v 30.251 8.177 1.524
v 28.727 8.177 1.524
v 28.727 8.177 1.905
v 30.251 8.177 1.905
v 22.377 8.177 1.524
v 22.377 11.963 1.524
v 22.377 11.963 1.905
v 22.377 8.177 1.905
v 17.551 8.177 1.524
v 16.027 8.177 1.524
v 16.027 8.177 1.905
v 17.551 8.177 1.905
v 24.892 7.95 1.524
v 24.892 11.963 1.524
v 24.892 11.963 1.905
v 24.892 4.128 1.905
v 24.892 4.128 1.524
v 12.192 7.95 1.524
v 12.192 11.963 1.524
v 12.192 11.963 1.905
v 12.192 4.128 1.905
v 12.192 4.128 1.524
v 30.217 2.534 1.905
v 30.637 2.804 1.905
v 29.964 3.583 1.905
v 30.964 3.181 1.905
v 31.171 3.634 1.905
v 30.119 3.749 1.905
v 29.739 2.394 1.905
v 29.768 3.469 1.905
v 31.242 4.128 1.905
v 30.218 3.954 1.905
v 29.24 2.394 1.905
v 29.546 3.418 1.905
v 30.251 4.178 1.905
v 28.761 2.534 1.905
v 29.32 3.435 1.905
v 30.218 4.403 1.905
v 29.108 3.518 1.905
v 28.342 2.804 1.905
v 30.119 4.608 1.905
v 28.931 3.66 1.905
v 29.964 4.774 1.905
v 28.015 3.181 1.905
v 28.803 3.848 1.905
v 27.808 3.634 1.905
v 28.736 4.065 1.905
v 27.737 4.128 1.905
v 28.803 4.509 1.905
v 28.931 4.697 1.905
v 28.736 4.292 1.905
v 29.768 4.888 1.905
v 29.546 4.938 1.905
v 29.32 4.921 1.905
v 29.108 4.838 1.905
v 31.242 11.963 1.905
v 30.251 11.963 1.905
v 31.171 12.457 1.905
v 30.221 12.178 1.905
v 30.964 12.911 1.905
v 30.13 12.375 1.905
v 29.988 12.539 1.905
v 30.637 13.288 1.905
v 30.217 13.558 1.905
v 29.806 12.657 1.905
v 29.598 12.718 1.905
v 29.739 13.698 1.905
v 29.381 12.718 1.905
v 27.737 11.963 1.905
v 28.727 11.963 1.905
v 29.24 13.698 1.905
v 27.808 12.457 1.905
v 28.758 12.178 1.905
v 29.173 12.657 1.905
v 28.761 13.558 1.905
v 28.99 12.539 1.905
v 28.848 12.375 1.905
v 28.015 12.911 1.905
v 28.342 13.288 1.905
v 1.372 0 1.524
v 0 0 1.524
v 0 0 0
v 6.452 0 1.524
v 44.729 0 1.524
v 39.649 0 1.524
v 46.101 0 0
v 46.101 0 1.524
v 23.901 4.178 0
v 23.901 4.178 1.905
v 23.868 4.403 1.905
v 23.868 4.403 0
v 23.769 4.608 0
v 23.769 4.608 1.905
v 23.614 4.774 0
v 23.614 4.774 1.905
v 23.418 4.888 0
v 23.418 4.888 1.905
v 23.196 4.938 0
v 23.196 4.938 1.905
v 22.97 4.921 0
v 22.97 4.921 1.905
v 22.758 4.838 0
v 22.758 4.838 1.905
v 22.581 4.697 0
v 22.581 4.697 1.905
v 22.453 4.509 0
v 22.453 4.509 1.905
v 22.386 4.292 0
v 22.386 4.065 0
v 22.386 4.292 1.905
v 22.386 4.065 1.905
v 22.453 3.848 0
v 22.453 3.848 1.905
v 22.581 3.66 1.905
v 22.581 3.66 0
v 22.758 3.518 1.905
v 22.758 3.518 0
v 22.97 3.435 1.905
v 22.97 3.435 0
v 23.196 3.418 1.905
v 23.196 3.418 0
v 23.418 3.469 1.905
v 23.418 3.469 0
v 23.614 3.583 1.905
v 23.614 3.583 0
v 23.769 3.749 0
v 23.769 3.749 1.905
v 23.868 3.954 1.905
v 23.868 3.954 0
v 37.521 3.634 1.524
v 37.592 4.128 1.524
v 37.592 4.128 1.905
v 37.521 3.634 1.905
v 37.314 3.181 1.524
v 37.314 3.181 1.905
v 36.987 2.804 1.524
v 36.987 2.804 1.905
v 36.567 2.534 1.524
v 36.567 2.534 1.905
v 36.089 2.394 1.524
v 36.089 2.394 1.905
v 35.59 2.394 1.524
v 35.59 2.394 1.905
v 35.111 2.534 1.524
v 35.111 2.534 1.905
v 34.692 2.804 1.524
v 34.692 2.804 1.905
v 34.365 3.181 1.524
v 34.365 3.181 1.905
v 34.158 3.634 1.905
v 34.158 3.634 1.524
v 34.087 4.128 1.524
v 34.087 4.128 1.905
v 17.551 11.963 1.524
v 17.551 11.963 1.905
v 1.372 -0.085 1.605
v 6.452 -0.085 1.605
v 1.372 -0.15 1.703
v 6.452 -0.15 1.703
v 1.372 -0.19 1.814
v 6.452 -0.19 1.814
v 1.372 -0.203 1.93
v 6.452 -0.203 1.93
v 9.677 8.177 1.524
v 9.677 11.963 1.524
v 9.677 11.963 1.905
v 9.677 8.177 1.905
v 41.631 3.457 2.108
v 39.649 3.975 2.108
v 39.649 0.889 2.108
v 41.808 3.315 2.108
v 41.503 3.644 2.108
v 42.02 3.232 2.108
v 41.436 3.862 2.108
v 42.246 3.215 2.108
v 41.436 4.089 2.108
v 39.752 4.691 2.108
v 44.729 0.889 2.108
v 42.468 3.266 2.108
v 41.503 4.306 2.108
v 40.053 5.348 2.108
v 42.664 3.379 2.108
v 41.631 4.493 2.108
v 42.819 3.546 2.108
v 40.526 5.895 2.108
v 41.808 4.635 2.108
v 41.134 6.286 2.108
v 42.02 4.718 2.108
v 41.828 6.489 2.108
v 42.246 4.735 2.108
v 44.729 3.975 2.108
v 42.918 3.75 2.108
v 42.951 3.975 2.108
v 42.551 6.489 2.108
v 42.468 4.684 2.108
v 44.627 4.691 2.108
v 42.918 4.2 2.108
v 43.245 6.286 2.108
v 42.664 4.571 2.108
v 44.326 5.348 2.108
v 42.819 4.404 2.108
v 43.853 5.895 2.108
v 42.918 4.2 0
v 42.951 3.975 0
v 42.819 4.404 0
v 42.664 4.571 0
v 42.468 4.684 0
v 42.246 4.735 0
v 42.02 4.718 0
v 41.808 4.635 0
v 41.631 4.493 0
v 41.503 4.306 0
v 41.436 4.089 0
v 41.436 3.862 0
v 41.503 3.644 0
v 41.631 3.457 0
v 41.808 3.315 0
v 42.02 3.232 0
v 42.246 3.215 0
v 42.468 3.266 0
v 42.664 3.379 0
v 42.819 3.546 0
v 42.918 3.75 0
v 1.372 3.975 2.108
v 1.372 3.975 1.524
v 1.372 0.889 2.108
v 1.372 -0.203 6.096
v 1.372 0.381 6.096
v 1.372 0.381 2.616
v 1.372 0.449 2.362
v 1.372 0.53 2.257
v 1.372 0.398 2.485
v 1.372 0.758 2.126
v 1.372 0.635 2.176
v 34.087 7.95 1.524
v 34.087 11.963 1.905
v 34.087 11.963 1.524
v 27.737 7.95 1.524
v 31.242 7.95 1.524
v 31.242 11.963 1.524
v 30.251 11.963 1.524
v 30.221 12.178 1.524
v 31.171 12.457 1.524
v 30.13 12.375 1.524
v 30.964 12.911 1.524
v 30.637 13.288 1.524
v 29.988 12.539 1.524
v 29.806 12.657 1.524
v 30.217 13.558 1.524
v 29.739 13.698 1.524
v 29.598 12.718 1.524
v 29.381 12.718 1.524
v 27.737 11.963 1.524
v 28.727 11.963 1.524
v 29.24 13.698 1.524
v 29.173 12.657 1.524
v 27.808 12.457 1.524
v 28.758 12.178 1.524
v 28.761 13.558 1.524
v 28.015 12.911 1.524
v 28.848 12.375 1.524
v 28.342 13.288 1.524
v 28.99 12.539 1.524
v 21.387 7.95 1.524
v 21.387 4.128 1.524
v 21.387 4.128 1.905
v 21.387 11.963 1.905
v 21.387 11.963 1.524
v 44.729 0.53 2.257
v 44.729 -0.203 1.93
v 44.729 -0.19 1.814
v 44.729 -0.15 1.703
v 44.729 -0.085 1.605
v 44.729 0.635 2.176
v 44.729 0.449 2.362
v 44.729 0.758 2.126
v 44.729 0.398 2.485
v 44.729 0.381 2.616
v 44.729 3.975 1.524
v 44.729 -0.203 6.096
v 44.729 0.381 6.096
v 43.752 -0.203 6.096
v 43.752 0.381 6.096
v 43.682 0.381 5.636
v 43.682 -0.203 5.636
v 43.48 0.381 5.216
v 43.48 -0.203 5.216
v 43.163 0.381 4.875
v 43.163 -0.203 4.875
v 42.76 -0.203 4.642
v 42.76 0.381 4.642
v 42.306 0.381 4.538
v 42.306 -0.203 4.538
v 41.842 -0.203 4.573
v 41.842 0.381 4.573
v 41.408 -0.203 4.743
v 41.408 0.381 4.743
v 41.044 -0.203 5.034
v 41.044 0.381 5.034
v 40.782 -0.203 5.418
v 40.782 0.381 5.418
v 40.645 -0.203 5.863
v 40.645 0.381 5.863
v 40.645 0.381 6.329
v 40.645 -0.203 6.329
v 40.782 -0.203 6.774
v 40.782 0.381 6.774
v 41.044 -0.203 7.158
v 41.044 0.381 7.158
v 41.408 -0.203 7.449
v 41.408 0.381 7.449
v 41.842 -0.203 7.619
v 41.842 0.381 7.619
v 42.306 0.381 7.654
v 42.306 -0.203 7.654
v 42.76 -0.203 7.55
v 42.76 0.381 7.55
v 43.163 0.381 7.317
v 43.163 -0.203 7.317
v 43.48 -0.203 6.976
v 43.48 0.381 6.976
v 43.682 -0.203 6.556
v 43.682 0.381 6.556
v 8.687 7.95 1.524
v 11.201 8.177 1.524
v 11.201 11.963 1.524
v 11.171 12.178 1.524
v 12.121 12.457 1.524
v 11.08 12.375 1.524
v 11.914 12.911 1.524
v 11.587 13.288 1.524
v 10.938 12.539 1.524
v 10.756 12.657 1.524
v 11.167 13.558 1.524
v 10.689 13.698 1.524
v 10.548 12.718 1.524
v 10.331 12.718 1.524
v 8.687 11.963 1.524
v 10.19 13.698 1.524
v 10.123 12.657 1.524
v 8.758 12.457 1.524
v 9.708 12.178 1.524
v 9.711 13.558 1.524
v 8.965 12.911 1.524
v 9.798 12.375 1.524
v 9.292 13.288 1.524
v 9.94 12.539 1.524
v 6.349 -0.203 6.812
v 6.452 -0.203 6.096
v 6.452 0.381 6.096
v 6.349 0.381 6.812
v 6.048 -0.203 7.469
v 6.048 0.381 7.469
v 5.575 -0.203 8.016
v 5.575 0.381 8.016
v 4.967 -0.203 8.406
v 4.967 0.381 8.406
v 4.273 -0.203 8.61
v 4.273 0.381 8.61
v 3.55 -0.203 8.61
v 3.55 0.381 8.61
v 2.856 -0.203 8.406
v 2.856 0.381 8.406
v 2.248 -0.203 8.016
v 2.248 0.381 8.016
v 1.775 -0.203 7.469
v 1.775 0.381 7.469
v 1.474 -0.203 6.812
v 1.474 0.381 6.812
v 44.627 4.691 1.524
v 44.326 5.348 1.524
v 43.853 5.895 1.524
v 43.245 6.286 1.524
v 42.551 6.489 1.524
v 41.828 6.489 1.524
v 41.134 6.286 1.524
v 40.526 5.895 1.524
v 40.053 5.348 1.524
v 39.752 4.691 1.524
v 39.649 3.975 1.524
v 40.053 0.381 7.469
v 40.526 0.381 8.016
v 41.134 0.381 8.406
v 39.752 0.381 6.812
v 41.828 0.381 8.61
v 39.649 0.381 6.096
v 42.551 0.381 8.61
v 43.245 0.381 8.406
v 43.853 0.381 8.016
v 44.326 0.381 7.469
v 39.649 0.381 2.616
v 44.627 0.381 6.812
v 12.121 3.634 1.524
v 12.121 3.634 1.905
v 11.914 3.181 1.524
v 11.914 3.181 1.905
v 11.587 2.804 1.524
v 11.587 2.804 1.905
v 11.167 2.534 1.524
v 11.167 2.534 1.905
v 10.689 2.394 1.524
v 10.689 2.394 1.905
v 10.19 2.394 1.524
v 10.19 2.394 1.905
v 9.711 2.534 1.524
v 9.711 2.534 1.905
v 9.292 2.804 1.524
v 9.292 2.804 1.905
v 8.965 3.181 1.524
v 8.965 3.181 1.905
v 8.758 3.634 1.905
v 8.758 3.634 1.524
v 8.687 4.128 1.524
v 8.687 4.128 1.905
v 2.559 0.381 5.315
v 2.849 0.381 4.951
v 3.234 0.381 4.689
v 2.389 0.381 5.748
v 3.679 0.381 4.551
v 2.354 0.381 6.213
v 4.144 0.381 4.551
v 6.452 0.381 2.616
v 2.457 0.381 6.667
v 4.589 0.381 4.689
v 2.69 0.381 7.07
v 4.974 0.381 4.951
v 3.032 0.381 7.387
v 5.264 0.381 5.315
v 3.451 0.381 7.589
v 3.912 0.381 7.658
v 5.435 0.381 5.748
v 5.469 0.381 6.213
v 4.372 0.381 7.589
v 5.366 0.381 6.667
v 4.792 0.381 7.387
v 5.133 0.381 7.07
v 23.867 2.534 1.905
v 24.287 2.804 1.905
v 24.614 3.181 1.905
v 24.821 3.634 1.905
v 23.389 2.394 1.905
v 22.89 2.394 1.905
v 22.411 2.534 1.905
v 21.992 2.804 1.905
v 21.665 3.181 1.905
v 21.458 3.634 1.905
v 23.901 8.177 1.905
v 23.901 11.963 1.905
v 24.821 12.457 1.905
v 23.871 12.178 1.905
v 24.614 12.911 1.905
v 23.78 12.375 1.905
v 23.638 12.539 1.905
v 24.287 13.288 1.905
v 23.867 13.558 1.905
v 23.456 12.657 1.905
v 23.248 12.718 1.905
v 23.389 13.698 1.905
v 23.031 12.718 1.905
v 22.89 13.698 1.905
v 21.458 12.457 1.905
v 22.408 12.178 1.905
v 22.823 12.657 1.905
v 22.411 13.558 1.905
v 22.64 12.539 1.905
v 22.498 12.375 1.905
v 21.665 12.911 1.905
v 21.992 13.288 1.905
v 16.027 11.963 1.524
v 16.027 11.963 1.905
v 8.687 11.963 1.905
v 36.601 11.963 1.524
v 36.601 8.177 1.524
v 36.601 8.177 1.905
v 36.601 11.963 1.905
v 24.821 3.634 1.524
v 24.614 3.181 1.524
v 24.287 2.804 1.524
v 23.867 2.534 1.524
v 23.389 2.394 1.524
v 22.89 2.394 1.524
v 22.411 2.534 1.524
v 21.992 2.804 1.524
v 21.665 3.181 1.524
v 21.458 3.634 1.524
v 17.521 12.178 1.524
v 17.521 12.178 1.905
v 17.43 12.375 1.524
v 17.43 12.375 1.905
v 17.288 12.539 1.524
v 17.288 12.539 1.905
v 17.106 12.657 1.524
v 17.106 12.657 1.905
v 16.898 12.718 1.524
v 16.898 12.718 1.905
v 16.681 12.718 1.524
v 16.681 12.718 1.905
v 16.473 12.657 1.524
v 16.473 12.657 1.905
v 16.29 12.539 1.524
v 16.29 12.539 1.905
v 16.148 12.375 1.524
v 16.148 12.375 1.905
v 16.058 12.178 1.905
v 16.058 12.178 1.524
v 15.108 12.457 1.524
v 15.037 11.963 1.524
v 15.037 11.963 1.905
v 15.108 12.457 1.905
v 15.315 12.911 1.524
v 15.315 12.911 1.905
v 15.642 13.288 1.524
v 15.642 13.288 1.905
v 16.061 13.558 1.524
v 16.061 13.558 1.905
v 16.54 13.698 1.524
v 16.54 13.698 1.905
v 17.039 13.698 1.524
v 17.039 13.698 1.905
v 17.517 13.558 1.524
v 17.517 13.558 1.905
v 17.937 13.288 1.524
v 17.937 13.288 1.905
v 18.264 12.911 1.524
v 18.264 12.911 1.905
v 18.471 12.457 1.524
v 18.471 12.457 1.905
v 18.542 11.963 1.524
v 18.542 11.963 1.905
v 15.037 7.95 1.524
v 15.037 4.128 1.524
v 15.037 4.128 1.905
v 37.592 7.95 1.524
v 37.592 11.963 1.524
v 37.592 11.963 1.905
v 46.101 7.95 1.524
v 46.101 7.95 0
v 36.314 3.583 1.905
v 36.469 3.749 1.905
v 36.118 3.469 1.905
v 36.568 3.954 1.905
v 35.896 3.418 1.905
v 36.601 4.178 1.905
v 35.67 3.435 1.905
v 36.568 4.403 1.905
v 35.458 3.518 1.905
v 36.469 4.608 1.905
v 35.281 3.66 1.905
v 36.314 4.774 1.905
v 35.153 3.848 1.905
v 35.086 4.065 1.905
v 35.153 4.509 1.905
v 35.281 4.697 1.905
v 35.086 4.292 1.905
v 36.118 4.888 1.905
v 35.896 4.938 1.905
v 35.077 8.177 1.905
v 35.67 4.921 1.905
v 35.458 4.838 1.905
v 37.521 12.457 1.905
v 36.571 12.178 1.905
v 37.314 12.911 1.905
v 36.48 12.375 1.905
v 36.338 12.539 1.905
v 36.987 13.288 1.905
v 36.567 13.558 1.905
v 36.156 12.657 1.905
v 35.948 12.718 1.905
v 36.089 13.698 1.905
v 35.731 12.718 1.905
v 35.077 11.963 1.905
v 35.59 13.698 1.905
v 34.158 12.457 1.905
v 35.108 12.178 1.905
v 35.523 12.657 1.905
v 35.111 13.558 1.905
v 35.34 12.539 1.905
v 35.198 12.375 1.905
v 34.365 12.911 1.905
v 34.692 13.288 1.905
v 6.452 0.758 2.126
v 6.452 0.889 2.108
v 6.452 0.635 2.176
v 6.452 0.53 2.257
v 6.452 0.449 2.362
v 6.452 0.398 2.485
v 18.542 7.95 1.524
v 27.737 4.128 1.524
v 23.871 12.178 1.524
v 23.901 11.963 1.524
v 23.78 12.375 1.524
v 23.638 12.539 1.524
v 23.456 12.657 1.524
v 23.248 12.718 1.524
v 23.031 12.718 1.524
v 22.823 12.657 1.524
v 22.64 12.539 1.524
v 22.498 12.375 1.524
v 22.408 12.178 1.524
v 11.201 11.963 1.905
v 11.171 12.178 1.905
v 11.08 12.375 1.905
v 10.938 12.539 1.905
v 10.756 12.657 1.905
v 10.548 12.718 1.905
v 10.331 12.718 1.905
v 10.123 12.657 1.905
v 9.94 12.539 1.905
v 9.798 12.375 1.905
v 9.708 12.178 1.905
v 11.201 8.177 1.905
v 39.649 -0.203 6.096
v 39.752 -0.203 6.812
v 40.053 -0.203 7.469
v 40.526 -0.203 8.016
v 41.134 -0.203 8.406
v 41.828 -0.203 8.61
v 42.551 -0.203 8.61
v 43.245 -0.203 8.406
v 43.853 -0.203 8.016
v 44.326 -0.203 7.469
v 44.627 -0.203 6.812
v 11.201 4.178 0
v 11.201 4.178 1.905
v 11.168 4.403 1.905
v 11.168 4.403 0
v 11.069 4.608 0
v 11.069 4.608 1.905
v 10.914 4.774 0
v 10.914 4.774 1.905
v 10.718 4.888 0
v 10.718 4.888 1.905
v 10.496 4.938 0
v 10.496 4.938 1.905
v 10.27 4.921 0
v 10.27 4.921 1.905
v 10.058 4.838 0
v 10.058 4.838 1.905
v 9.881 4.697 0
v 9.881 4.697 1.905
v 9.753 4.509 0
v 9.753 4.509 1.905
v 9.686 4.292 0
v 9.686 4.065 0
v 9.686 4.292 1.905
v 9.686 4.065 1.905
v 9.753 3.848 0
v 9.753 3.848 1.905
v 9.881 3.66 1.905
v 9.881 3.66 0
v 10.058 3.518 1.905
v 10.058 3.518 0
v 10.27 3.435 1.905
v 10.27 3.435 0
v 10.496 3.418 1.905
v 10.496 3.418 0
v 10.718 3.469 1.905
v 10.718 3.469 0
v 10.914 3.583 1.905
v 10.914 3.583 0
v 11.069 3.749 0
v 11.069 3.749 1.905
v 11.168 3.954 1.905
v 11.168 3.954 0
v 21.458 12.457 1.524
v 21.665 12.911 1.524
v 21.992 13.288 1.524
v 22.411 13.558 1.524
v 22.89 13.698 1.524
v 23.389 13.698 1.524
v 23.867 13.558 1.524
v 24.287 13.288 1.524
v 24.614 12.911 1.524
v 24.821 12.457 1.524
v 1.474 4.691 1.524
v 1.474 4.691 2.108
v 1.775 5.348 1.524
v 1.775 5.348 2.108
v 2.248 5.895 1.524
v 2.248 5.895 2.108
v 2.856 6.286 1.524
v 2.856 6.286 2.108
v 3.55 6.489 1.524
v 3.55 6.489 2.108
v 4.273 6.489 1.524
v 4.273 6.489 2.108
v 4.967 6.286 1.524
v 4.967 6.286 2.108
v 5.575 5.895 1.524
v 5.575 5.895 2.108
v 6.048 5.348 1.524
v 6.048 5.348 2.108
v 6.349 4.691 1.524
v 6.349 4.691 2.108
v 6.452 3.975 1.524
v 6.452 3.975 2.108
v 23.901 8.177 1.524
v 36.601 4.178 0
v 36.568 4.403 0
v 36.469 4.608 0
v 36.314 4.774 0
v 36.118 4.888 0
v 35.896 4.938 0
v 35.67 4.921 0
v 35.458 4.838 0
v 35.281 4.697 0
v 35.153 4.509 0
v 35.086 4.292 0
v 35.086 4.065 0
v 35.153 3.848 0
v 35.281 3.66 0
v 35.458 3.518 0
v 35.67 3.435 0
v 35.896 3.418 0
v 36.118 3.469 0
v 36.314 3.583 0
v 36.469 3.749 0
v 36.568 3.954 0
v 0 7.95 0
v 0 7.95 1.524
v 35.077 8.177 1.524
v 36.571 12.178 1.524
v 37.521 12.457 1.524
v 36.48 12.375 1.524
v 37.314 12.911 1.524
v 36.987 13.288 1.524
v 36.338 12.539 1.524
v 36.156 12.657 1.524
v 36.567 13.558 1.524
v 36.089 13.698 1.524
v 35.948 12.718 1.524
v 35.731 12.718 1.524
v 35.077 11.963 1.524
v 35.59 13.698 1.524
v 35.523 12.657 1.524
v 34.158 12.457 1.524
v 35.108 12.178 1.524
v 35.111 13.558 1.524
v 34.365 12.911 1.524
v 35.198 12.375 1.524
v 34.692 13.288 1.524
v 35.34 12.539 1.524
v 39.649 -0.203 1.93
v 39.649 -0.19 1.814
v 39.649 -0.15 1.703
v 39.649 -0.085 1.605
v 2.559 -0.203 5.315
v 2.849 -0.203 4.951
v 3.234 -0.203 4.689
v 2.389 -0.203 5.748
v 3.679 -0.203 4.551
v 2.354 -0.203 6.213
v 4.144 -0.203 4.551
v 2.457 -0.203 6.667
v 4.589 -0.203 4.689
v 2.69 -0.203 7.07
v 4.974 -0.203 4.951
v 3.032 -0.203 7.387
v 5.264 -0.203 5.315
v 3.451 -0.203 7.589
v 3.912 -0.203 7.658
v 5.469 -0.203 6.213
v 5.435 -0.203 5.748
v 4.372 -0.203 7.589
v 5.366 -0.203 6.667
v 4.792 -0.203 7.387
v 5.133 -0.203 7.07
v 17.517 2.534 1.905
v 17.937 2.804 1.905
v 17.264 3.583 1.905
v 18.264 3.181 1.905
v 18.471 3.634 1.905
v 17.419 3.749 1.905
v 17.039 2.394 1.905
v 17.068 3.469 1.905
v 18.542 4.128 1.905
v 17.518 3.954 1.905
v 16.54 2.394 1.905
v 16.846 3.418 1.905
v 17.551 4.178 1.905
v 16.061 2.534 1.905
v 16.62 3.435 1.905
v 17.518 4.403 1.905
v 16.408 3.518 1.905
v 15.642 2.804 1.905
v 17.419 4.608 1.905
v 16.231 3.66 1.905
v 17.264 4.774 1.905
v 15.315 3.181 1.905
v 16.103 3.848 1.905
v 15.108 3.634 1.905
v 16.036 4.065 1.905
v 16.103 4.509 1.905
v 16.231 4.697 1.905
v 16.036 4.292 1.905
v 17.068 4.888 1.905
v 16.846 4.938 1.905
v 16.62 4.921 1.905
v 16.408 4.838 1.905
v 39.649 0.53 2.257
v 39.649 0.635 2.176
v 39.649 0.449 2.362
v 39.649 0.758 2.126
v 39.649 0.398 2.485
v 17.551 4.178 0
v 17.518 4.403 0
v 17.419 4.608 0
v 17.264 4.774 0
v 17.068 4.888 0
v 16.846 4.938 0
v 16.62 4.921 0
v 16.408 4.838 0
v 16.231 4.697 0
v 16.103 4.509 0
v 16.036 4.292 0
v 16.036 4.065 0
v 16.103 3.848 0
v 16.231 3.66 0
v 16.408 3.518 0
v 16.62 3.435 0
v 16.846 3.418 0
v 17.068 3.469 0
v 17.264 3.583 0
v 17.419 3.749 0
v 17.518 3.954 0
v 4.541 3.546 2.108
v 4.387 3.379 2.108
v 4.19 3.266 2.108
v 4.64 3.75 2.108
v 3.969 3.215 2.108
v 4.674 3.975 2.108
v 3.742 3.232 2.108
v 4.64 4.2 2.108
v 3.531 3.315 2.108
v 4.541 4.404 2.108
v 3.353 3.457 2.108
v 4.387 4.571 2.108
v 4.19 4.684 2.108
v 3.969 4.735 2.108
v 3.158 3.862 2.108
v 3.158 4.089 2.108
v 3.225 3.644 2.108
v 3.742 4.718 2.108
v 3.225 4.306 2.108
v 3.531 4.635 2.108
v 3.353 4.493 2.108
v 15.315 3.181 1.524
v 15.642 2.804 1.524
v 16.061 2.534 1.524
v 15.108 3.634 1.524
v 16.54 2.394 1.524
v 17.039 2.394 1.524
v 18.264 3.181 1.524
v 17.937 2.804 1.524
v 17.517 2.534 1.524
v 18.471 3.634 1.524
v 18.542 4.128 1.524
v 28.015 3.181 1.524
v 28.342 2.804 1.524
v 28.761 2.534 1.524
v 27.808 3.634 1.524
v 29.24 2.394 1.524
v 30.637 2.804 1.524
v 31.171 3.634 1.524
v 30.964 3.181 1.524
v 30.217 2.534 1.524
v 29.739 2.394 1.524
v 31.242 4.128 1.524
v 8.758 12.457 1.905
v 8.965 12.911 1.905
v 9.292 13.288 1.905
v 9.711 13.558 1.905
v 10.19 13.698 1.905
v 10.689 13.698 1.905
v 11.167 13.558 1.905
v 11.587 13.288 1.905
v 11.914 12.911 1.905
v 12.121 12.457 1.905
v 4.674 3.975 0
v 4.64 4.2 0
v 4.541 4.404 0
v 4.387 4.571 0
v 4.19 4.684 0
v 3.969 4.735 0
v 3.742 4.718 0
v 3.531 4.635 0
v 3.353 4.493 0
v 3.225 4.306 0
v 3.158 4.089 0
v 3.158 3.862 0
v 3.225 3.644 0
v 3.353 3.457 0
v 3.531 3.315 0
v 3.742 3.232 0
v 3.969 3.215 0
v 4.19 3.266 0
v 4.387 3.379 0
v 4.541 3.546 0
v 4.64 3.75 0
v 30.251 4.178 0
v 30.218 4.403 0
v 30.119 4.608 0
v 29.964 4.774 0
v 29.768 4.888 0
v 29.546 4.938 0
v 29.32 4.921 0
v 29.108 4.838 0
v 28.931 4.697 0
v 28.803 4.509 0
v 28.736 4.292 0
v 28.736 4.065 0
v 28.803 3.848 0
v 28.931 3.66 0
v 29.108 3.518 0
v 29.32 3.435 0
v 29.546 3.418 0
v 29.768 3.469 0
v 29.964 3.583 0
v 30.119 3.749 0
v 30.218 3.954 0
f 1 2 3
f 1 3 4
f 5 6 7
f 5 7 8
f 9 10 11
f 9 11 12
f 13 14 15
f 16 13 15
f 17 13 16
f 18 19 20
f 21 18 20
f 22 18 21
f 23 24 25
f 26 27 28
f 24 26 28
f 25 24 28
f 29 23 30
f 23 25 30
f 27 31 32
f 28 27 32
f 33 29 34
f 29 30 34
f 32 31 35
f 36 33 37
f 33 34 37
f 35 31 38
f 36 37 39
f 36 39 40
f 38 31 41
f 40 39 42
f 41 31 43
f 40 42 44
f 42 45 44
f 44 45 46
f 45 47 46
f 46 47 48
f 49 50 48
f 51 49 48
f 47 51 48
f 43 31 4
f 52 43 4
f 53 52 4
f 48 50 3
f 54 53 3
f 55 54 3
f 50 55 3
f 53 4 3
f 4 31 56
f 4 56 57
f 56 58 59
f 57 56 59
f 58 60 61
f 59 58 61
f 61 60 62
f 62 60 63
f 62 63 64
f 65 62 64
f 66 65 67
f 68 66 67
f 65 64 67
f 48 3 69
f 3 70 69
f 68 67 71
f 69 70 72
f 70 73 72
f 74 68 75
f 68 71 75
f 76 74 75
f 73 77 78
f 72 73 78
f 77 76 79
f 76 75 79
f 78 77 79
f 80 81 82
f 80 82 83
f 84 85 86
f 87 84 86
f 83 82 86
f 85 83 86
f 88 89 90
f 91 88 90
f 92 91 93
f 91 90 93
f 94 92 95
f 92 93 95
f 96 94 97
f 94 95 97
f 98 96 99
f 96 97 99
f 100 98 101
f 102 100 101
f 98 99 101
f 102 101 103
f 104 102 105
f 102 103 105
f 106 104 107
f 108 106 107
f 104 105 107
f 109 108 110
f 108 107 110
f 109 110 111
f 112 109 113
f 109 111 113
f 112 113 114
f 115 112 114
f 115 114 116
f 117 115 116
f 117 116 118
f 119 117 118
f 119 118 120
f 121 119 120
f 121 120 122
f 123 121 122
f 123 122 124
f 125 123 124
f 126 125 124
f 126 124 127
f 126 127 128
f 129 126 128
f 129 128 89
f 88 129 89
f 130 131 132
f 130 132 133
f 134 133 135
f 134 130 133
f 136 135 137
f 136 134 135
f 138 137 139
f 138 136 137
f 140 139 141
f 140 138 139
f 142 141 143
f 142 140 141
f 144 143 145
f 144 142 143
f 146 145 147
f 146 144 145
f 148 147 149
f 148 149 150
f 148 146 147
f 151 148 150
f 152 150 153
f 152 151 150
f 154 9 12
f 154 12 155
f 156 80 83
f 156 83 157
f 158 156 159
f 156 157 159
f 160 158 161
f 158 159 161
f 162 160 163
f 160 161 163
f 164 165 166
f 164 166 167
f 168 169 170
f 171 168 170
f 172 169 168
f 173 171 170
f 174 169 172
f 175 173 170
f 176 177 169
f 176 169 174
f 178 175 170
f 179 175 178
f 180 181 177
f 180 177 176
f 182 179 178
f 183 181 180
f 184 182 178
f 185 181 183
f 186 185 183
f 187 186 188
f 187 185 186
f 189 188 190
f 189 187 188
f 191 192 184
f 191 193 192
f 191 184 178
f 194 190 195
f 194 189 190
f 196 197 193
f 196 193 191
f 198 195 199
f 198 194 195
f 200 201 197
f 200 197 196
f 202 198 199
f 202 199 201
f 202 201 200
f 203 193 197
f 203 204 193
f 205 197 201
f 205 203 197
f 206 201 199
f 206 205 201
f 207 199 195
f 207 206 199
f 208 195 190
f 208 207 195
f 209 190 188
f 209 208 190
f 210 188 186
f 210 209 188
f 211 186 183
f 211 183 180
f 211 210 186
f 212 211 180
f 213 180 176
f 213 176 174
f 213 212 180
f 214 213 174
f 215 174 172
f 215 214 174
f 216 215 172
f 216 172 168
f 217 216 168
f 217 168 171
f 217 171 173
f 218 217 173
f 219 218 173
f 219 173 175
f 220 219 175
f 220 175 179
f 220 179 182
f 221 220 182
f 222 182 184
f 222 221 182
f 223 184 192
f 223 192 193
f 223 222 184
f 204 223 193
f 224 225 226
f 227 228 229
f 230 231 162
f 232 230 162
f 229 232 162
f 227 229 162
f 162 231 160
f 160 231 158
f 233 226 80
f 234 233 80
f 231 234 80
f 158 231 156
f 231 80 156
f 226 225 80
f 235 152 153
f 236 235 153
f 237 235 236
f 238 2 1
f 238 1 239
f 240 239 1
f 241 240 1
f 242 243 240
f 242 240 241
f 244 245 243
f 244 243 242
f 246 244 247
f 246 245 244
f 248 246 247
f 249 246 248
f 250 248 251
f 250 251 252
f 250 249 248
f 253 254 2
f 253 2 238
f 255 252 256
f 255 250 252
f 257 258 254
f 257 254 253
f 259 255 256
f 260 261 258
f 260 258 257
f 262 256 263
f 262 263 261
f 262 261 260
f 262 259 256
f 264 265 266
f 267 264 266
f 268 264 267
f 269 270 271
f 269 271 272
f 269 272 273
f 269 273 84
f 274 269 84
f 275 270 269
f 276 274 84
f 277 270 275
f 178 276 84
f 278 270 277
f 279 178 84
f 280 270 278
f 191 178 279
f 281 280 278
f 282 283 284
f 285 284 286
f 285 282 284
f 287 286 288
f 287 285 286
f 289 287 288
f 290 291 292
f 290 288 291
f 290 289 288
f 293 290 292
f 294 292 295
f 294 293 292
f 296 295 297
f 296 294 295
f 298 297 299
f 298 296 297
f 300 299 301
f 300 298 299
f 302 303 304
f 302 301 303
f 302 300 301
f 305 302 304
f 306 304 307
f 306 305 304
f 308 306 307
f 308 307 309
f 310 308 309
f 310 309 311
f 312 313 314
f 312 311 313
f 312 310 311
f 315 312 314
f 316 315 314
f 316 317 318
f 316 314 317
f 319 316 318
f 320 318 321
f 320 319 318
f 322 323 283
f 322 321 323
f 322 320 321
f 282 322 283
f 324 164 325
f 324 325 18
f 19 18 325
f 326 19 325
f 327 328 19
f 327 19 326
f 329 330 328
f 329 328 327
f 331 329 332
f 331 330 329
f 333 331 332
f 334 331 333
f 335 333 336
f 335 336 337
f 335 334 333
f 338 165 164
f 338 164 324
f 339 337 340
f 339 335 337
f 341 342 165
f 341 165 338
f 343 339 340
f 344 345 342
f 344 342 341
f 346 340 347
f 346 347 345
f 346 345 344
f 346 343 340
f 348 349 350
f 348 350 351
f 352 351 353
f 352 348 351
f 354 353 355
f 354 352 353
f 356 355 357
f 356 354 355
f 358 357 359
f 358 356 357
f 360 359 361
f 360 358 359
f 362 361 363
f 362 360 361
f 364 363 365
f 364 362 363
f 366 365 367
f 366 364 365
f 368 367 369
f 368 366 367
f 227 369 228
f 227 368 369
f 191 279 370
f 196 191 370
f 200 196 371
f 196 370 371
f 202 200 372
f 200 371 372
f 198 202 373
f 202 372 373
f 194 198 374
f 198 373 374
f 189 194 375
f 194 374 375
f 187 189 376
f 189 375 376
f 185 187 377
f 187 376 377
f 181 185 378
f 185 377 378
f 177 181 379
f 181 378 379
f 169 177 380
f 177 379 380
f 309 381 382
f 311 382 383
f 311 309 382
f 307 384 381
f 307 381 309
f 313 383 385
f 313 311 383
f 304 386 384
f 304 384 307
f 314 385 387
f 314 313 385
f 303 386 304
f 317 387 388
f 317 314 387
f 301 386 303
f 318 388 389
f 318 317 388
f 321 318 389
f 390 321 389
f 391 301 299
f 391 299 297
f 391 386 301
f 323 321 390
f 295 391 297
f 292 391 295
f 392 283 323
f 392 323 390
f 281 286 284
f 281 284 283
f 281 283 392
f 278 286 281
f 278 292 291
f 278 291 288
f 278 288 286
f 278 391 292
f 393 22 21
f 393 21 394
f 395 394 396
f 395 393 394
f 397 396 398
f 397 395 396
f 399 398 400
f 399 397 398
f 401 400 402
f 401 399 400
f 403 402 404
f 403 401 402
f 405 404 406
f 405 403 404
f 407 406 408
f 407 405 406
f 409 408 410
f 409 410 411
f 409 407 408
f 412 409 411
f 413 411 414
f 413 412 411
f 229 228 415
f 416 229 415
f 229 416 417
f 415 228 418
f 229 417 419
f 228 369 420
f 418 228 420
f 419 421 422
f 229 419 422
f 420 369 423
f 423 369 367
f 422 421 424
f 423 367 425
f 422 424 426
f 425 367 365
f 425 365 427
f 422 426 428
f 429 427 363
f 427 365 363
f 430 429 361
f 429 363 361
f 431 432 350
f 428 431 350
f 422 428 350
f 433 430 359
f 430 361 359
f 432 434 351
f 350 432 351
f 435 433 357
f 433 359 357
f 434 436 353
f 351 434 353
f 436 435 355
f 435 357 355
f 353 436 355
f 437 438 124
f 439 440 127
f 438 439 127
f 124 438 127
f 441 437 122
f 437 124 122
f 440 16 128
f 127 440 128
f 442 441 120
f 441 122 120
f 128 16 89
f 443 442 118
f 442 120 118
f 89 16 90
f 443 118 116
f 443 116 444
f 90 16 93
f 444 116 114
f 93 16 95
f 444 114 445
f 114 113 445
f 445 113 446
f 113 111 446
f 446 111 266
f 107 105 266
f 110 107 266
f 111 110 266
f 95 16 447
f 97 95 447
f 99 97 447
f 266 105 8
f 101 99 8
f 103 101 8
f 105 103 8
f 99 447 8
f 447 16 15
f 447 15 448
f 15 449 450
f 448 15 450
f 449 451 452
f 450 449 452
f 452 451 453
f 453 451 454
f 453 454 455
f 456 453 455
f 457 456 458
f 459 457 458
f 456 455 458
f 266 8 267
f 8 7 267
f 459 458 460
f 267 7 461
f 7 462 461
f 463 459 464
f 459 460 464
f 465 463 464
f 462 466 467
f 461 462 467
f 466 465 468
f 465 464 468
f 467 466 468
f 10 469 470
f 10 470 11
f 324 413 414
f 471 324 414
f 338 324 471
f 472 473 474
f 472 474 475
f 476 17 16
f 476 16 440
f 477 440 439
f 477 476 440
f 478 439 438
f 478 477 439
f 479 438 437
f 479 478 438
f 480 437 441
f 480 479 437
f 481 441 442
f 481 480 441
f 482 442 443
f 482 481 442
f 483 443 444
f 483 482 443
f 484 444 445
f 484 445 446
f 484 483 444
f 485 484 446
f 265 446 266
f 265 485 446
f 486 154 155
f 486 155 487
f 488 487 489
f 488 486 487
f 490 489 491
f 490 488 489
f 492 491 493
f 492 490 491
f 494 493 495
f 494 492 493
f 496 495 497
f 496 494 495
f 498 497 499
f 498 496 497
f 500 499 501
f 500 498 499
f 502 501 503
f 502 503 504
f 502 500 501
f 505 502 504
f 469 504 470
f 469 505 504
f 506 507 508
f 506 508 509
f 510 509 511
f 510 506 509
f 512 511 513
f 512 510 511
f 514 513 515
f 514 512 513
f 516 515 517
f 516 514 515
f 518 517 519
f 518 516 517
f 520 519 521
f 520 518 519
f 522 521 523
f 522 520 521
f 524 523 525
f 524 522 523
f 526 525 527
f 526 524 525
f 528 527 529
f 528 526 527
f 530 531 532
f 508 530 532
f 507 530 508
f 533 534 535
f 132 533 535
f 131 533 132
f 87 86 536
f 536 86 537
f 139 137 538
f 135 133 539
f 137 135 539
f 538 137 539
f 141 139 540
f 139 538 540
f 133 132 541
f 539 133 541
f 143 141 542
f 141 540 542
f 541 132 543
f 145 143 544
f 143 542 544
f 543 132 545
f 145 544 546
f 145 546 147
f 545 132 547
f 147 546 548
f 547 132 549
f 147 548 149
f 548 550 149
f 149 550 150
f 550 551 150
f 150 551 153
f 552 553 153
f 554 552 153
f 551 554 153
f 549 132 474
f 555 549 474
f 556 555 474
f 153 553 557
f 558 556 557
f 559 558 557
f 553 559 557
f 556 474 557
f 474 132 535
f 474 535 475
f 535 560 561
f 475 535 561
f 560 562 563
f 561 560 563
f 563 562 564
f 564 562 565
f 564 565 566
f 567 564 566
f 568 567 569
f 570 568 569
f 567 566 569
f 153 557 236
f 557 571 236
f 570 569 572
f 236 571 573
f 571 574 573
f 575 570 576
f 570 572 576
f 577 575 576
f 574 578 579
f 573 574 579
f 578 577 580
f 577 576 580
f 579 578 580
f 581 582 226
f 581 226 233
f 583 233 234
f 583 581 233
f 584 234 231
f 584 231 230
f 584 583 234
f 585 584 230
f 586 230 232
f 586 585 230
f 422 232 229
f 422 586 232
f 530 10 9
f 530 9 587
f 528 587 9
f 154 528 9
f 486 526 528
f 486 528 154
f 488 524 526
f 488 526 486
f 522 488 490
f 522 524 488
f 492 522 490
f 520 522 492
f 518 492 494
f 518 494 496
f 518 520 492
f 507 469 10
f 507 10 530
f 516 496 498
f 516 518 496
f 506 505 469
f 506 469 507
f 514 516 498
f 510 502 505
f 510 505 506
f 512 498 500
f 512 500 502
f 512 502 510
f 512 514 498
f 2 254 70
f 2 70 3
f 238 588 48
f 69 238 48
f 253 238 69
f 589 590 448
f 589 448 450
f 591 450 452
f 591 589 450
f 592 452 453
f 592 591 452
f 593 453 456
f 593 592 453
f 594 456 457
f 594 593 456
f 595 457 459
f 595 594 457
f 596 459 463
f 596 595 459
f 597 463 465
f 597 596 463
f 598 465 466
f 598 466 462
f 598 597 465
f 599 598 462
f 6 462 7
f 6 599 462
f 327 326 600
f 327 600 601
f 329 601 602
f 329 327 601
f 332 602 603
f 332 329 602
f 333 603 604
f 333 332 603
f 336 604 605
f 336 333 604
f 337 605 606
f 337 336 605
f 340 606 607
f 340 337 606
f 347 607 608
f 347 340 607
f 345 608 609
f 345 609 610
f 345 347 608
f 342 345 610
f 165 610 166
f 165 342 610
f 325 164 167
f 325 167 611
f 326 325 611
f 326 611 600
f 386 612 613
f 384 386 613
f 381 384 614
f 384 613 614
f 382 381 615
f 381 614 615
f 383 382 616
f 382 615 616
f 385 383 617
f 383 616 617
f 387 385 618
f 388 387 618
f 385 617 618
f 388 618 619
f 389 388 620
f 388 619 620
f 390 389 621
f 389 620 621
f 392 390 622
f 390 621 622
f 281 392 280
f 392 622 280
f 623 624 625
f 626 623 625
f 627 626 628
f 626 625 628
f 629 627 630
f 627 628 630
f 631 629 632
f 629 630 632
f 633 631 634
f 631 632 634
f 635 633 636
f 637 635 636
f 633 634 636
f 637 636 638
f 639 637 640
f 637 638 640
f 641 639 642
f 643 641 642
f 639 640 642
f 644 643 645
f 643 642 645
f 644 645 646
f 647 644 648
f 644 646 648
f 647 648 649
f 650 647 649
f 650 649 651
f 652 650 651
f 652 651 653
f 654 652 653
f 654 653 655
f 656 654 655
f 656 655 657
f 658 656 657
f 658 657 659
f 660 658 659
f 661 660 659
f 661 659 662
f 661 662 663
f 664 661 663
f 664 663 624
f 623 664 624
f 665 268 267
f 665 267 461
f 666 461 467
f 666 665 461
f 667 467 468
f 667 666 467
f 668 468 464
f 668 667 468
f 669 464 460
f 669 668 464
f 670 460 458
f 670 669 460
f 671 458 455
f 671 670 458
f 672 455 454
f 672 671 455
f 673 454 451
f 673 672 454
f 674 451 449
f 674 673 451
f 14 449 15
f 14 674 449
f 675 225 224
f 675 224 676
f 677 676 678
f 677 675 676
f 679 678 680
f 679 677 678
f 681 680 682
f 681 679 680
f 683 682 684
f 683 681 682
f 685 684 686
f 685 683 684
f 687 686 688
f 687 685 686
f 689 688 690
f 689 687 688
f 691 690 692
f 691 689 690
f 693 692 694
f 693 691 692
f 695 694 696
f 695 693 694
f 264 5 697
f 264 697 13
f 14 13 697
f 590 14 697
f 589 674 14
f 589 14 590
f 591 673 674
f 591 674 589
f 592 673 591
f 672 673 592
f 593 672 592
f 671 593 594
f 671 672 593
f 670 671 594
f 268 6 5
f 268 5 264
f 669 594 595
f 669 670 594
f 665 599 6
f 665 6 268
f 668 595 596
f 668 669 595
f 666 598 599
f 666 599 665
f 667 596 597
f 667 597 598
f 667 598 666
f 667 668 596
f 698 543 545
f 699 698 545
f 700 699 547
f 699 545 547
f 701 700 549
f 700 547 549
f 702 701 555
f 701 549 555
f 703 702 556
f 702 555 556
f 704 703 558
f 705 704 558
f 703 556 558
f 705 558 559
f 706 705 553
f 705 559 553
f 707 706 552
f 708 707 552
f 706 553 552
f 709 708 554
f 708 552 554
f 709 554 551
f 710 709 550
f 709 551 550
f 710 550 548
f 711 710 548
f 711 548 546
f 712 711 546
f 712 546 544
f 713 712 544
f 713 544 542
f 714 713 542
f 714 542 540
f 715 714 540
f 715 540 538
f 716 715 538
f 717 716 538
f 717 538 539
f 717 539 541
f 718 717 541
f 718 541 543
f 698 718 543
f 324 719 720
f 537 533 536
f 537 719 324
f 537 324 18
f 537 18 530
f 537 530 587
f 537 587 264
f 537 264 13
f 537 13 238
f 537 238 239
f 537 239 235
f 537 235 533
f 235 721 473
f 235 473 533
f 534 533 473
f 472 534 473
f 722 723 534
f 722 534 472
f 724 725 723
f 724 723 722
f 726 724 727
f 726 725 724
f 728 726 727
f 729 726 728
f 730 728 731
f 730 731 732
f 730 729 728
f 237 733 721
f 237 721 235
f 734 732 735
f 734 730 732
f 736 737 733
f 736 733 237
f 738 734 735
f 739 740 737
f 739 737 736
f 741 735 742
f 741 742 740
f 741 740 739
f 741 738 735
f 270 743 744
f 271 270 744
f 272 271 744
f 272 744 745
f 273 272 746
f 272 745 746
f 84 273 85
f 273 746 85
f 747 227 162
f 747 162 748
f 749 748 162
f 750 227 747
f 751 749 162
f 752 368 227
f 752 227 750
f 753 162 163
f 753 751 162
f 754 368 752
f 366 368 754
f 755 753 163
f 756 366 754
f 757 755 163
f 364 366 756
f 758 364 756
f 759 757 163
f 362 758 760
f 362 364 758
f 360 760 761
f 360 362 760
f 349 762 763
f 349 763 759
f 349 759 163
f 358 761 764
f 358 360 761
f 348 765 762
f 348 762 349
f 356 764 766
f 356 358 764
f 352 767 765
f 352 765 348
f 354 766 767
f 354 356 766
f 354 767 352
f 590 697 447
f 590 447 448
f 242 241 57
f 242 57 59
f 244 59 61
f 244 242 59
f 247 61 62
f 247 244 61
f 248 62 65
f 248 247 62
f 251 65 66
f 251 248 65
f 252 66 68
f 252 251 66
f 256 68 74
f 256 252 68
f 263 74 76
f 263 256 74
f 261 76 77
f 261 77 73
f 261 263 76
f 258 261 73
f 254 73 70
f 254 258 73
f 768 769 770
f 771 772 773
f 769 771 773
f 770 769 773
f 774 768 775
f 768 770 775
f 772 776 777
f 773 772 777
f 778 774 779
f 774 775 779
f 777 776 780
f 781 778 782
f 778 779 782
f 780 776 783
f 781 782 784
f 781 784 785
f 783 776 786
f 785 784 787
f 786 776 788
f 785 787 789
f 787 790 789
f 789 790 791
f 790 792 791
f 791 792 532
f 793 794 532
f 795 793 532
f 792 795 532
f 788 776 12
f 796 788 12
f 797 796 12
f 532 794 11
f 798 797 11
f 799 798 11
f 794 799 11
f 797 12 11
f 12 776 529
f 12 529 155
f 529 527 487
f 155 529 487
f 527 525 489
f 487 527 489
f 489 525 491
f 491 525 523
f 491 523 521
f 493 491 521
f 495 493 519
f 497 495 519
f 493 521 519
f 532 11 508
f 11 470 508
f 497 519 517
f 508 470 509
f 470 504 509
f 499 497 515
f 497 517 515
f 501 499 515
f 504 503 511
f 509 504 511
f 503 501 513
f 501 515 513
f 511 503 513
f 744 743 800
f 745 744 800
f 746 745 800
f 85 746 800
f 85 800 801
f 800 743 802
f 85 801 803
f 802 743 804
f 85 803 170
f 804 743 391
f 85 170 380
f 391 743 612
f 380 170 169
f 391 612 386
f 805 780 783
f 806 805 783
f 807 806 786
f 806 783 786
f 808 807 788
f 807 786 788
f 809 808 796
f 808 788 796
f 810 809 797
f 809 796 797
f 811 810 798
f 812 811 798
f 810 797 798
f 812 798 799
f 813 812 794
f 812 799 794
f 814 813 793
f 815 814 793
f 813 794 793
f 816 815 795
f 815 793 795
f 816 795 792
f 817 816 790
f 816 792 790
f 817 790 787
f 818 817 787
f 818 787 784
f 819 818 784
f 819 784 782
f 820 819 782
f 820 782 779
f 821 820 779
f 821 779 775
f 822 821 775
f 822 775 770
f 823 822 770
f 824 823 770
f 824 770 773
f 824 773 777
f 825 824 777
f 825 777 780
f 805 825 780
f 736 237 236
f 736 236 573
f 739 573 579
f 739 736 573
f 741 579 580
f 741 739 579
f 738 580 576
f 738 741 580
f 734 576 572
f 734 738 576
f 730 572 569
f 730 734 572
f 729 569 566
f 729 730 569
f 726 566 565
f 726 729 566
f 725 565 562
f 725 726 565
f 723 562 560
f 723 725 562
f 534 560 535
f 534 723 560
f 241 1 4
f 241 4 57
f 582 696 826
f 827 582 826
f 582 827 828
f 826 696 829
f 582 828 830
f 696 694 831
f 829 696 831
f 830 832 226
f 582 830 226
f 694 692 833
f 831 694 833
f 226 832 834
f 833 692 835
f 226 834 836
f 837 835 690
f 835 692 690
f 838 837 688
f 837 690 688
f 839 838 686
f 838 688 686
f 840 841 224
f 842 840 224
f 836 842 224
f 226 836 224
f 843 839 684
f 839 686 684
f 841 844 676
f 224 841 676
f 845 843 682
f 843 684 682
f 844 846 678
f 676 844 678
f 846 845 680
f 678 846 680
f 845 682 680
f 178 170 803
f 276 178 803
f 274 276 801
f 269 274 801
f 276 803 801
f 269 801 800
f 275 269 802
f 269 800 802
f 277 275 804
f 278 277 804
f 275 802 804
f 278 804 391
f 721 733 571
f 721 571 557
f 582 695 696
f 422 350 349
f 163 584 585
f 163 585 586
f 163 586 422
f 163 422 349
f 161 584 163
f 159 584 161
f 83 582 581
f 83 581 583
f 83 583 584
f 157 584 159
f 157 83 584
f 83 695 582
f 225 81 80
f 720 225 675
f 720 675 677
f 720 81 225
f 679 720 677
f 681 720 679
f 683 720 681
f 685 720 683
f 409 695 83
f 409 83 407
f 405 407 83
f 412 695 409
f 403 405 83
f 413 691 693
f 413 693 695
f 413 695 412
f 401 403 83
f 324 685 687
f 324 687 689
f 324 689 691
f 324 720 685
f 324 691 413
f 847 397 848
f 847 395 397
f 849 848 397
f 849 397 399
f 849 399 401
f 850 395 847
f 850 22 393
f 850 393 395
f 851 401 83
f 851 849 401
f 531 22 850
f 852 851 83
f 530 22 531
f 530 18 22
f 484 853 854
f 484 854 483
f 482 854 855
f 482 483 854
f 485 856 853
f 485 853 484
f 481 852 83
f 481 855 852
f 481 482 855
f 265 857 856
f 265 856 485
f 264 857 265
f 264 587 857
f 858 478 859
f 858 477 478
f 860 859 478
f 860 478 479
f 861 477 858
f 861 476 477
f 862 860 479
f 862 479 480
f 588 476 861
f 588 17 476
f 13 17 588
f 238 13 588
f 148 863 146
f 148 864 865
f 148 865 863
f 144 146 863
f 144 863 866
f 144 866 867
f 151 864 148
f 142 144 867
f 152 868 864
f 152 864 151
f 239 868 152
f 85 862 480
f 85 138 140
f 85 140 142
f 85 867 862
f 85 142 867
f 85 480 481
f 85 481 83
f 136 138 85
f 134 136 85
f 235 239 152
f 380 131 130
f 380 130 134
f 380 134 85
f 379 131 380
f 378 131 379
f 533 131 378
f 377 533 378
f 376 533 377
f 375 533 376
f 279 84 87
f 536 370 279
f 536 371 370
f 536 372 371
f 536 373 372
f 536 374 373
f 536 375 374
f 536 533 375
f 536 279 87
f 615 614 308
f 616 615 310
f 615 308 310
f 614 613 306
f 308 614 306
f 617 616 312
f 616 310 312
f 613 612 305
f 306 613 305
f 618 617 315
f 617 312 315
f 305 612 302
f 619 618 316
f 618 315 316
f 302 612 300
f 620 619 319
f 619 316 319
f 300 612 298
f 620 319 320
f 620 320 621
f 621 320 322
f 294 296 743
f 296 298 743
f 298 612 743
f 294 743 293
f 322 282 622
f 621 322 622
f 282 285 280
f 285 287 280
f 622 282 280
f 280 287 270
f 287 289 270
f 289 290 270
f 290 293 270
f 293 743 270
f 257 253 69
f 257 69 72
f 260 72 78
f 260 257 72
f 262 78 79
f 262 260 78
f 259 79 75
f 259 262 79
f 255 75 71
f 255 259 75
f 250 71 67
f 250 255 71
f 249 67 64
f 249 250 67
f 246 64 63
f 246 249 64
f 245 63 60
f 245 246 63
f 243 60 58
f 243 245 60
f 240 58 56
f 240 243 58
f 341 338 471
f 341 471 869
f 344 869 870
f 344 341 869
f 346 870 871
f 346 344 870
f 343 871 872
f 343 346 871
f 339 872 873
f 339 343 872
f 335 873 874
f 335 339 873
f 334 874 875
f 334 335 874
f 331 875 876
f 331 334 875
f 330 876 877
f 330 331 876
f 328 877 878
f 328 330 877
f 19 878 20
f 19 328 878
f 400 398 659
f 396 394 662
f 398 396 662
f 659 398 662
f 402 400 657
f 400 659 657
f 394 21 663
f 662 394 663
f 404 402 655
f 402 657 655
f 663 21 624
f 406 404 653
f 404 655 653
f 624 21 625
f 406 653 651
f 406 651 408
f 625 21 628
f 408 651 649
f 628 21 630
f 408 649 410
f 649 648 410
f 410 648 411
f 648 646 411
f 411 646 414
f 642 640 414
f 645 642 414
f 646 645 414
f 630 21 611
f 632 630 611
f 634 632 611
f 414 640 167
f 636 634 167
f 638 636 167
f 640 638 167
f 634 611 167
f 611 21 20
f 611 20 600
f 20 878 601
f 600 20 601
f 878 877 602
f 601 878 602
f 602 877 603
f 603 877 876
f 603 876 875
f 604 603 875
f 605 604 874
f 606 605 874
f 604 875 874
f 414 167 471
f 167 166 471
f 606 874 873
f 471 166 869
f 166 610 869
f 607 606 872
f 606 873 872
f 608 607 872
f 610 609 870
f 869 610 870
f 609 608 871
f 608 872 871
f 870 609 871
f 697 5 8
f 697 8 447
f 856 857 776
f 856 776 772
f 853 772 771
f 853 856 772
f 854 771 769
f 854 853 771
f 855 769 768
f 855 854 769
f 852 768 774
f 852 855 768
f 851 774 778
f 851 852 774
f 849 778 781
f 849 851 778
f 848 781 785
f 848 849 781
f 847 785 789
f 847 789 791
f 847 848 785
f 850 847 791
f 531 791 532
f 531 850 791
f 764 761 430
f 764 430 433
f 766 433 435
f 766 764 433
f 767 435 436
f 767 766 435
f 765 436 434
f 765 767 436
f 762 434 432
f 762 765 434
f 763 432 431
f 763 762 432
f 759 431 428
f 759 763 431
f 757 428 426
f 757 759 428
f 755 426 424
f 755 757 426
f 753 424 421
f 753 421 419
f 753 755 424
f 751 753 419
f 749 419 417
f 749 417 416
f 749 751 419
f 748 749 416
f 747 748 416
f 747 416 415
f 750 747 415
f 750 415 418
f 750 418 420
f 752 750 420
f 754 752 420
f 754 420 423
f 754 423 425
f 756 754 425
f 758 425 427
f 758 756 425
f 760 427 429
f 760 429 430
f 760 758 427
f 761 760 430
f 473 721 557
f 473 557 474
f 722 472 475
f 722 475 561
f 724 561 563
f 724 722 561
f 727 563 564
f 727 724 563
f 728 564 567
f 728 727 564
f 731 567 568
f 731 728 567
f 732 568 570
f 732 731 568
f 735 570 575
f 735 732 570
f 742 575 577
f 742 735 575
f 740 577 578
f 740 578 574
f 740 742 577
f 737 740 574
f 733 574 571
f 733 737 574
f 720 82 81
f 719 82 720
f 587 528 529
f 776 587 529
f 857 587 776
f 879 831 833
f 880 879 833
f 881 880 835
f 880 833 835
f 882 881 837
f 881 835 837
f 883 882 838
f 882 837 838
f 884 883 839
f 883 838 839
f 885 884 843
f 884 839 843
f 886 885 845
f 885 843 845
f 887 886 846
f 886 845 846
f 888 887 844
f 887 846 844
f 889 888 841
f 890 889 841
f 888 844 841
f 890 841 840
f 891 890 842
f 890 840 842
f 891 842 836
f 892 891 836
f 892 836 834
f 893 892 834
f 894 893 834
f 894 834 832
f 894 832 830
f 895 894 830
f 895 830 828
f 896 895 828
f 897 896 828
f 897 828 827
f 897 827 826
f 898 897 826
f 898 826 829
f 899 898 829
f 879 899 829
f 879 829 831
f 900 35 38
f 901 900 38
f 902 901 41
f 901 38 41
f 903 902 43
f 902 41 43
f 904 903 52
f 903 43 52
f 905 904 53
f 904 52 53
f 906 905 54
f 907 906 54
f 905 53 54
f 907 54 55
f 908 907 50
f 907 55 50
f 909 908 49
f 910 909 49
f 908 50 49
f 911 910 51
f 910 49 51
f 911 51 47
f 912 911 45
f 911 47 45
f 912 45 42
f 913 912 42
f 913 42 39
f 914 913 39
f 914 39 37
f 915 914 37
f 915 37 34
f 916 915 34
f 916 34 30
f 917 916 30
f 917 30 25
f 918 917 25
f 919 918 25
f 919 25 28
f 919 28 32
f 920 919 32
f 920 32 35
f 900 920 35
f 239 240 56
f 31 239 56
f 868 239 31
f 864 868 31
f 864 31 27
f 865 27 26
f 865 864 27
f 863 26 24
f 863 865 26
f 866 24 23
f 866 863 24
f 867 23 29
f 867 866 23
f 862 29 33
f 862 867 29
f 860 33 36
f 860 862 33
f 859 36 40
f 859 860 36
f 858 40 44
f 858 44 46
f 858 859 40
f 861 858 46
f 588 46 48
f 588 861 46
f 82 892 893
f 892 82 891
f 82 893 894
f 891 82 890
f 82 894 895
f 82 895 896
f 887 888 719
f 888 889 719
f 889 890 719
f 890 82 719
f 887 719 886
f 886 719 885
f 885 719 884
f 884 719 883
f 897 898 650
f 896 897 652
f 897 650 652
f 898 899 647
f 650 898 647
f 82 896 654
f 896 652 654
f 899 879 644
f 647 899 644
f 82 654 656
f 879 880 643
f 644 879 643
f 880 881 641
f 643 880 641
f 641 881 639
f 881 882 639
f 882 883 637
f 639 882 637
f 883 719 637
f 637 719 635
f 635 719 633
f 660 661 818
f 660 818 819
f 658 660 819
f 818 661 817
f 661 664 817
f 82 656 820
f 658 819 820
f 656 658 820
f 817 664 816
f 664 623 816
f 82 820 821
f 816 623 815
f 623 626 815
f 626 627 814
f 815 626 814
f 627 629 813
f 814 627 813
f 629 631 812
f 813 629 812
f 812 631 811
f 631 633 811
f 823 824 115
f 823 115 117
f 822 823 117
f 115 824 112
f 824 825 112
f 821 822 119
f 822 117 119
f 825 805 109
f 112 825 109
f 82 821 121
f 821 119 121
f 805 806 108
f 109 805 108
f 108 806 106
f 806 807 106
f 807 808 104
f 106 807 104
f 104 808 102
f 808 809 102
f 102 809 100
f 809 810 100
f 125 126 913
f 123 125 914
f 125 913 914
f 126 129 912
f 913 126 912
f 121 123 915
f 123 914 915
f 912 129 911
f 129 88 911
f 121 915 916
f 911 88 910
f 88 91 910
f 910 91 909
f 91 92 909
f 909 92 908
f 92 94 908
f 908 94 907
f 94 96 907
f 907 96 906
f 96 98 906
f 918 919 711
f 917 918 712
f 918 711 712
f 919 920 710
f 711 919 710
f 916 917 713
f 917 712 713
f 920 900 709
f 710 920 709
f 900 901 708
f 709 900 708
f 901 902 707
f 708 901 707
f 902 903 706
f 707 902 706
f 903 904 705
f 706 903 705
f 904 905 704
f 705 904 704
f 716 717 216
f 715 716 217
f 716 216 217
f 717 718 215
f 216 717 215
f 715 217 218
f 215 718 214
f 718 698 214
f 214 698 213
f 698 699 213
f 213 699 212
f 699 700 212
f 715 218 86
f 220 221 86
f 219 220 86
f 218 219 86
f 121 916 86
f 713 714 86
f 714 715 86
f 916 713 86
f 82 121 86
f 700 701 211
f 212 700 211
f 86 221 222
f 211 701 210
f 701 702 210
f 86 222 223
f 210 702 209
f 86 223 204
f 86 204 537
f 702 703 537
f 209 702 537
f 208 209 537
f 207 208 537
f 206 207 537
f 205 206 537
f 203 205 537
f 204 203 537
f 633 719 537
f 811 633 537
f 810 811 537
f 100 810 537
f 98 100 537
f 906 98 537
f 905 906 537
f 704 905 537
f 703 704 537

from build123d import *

# Parameters (mm, degrees)
SKETCH1_W           = 46.101
SKETCH1_H           = 7.9502
BASE_EXTRUDE_DEPTH  = 1.524
BOSS_EXTRUDE1_DEPTH = 0.5842
SKETCH3_R           = 1.5621
BOSS_EXTRUDE2_DEPTH = 0.5842
FILLET1_R           = 0.508
SKETCH4_R           = 0.762
CUT_EXTRUDE1_DEPTH  = 48.234733554
MIRROR1_START       = -1
MIRROR1_OUTLINE_R   = 0.762
MIRROR1_DEPTH       = 2.524
MIRROR1_START_2     = 1.524
MIRROR1_2_OUTLINE_R = 0.762
MIRROR1_2_DEPTH     = 0.5842
MIRROR1_START_3     = 1.9304
MIRROR1_3_OUTLINE_W = 5.08
MIRROR1_3_OUTLINE_H = 0.5842
MIRROR1_3_DEPTH     = 2.6034999
MIRROR1_START_4     = 39.6494
MIRROR1_4_DEPTH     = 5.08
MIRROR1_START_5     = -0.2032
MIRROR1_5_OUTLINE_R = 1.5621
MIRROR1_5_DEPTH     = 0.5842
BOSS_EXTRUDE3_DEPTH = 0.381
SKETCH6_R           = 0.762
CUT_EXTRUDE2_DEPTH  = 2.54
LPATTERN1_COUNT     = 5
LPATTERN1_PITCH     = 6.35


with BuildPart() as part:
    # Sketch1 → Base-Extrude (new body)
    with BuildSketch(Plane.XY):
        with Locations((23.0505, 3.9751)):
            Rectangle(SKETCH1_W, SKETCH1_H)
    extrude(amount=BASE_EXTRUDE_DEPTH)

    # Sketch2 → Boss-Extrude1 (add)
    with BuildSketch(Plane.XY.offset(1.524)):
        with BuildLine():
            Line((6.4516, 3.9751), (6.4516, -0.2032))
            Line((6.4516, -0.2032), (1.3716, -0.2032))
            Line((1.3716, -0.2032), (1.3716, 3.9751))
            ThreePointArc((1.3716, 3.9751), (3.9116, 6.5151), (6.4516, 3.9751))
        make_face()
    extrude(amount=BOSS_EXTRUDE1_DEPTH)

    # Sketch3 → Boss-Extrude2 (add)
    with BuildSketch(Plane(origin=(0, -0.2032, 0), x_dir=(-1, 0, 0), z_dir=(0, 1, 0))):
        with BuildLine():
            Line((-1.3716, 6.096), (-1.3716, 1.524))
            Line((-1.3716, 1.524), (-6.4516, 1.524))
            Line((-6.4516, 1.524), (-6.4516, 6.096))
            ThreePointArc((-6.4516, 6.096), (-3.9116, 8.636), (-1.3716, 6.096))
        make_face()
        with Locations(Location((-3.9116, 6.096, 0), (0, 0, 90))):
            Circle(SKETCH3_R, mode=Mode.SUBTRACT)
    extrude(amount=BOSS_EXTRUDE2_DEPTH)

    # Fillet1
    # the kernel refuses this fillet: 0.508 mm, written as the material it adds along each edge
    with BuildSketch(Plane(origin=(6.4516, 0.381, 2.1082), x_dir=(0, 1, 0), z_dir=(-1, 0, 0))) as fillet1_piece_1:
        with BuildLine():
            CenterArc((FILLET1_R, -FILLET1_R), FILLET1_R, 90, 90)
            Line((0, -FILLET1_R), (0, 0))
            Line((0, 0), (FILLET1_R, 0))
        make_face()
    extrude(amount=5.08)
    # the kernel refuses this fillet: 0.508 mm, written as the material it takes off along each edge
    with BuildSketch(Plane(origin=(7.4676, -0.2032, 1.524), x_dir=(0, 1.0, 2.6098982991759982e-11), z_dir=(-1, 0, 0))) as fillet1_2_piece_1:
        with BuildLine():
            CenterArc((0.508, -0.4064), FILLET1_R, 126.869897647, 53.130102355)
            Line((0, -0.4064), (0, 0))
            Line((0, 0), (0.2032, 0))
        make_face()
    extrude(amount=7.112, mode=Mode.SUBTRACT)

    # Sketch4 → Cut-Extrude1 (cut, through all)
    with BuildSketch(Plane.XY.offset(2.1082)):
        with Locations((3.9116, 3.9751)):
            Circle(SKETCH4_R)
    extrude(amount=-CUT_EXTRUDE1_DEPTH, mode=Mode.SUBTRACT)

    # Mirror1: read off the stored shape, not the designer's step
    # Mirror1 outline → Mirror1 (cut)
    with BuildSketch(Plane.XY.offset(MIRROR1_START)):
        with Locations((42.1894, 3.9751)):
            Circle(MIRROR1_OUTLINE_R)
    extrude(amount=MIRROR1_DEPTH, mode=Mode.SUBTRACT)

    # Mirror1 2 outline → Mirror1 2 (add)
    with BuildSketch(Plane.XY.offset(MIRROR1_START_2)):
        with BuildLine():
            Line((39.6494, 3.9751), (39.6494, 0.381))
            Line((39.6494, 0.381), (44.7294, 0.381))
            Line((44.7294, 0.381), (44.7294, 3.9751))
            ThreePointArc((44.7294, 3.9751), (42.1894, 6.5151), (39.6494, 3.9751))
        make_face()
        with Locations((42.1894, 3.9751)):
            Circle(MIRROR1_2_OUTLINE_R, mode=Mode.SUBTRACT)
    extrude(amount=MIRROR1_2_DEPTH)

    # Mirror1 3 outline → Mirror1 3 (add)
    with BuildSketch(Plane.XY.offset(MIRROR1_START_3)):
        with Locations((42.1894, 0.0889)):
            Rectangle(MIRROR1_3_OUTLINE_W, MIRROR1_3_OUTLINE_H)
    extrude(amount=MIRROR1_3_DEPTH)

    # Mirror1 4 outline → Mirror1 4 (add)
    with BuildSketch(Plane.YZ.offset(MIRROR1_START_4)):
        with BuildLine():
            Line((0.381, 1.9304), (-0.2032, 1.9304))
            ThreePointArc((-0.2032, 1.9304), (-0.149569013, 1.703215493), (0, 1.524))
            Line((0, 1.524), (0.381, 1.524))
            Line((0.381, 1.524), (0.381, 1.9304))
        make_face()
        with BuildLine():
            ThreePointArc((0.889, 2.1082), (0.529789755, 2.256989755), (0.381, 2.6162))
            Line((0.381, 2.6162), (0.381, 2.1082))
            Line((0.381, 2.1082), (0.889, 2.1082))
        make_face()
    extrude(amount=MIRROR1_4_DEPTH)

    # Mirror1 5 outline → Mirror1 5 (add)
    with BuildSketch(Plane(origin=(0, 0, 0), x_dir=(1, 0, 0), z_dir=(0, 1, 0)).offset(MIRROR1_START_5)):
        with BuildLine():
            Line((39.6494, -2.6162), (39.6494, -6.096))
            ThreePointArc((39.6494, -6.096), (42.1894, -8.636), (44.7294, -6.096))
            Line((44.7294, -6.096), (44.7294, -2.6162))
            Line((44.7294, -2.6162), (39.6494, -2.6162))
        make_face()
        with Locations((42.1894, -6.096)):
            Circle(MIRROR1_5_OUTLINE_R, mode=Mode.SUBTRACT)
    extrude(amount=MIRROR1_5_DEPTH)

    # Sketch5 → Boss-Extrude3 (add)
    with BuildSketch(Plane.XY.offset(1.524)):
        with BuildLine():
            Line((37.592, 11.9634508), (37.592, 4.128262))
            ThreePointArc((37.592, 4.128262), (35.8394, 2.375662), (34.0868, 4.128262))
            Line((34.0868, 4.128262), (34.0868, 11.9634508))
            ThreePointArc((34.0868, 11.9634508), (35.8394, 13.7160508), (37.592, 11.9634508))
        make_face()
        with BuildLine():
            Line((35.0774, 8.177194519), (36.6014, 8.177194519))
            Line((36.6014, 8.177194519), (36.6014, 11.9634508))
            ThreePointArc((36.6014, 11.9634508), (35.8394, 12.7254508), (35.0774, 11.9634508))
            Line((35.0774, 11.9634508), (35.0774, 8.177194519))
        make_face(mode=Mode.SUBTRACT)
    boss_extrude3 = extrude(amount=BOSS_EXTRUDE3_DEPTH)

    # Sketch6 → Cut-Extrude2 (cut)
    with BuildSketch(Plane.XY.offset(1.905)):
        with Locations((35.8394, 4.1783)):
            Circle(SKETCH6_R)
    cut_extrude2 = extrude(amount=-CUT_EXTRUDE2_DEPTH, mode=Mode.SUBTRACT)

    # LPattern1: Boss-Extrude3, Cut-Extrude2 ×5
    with Locations(*[(-i * LPATTERN1_PITCH, 0, 0) for i in range(1, LPATTERN1_COUNT)]):
        add(boss_extrude3)
        add(cut_extrude2, mode=Mode.SUBTRACT)


solid = part.part
